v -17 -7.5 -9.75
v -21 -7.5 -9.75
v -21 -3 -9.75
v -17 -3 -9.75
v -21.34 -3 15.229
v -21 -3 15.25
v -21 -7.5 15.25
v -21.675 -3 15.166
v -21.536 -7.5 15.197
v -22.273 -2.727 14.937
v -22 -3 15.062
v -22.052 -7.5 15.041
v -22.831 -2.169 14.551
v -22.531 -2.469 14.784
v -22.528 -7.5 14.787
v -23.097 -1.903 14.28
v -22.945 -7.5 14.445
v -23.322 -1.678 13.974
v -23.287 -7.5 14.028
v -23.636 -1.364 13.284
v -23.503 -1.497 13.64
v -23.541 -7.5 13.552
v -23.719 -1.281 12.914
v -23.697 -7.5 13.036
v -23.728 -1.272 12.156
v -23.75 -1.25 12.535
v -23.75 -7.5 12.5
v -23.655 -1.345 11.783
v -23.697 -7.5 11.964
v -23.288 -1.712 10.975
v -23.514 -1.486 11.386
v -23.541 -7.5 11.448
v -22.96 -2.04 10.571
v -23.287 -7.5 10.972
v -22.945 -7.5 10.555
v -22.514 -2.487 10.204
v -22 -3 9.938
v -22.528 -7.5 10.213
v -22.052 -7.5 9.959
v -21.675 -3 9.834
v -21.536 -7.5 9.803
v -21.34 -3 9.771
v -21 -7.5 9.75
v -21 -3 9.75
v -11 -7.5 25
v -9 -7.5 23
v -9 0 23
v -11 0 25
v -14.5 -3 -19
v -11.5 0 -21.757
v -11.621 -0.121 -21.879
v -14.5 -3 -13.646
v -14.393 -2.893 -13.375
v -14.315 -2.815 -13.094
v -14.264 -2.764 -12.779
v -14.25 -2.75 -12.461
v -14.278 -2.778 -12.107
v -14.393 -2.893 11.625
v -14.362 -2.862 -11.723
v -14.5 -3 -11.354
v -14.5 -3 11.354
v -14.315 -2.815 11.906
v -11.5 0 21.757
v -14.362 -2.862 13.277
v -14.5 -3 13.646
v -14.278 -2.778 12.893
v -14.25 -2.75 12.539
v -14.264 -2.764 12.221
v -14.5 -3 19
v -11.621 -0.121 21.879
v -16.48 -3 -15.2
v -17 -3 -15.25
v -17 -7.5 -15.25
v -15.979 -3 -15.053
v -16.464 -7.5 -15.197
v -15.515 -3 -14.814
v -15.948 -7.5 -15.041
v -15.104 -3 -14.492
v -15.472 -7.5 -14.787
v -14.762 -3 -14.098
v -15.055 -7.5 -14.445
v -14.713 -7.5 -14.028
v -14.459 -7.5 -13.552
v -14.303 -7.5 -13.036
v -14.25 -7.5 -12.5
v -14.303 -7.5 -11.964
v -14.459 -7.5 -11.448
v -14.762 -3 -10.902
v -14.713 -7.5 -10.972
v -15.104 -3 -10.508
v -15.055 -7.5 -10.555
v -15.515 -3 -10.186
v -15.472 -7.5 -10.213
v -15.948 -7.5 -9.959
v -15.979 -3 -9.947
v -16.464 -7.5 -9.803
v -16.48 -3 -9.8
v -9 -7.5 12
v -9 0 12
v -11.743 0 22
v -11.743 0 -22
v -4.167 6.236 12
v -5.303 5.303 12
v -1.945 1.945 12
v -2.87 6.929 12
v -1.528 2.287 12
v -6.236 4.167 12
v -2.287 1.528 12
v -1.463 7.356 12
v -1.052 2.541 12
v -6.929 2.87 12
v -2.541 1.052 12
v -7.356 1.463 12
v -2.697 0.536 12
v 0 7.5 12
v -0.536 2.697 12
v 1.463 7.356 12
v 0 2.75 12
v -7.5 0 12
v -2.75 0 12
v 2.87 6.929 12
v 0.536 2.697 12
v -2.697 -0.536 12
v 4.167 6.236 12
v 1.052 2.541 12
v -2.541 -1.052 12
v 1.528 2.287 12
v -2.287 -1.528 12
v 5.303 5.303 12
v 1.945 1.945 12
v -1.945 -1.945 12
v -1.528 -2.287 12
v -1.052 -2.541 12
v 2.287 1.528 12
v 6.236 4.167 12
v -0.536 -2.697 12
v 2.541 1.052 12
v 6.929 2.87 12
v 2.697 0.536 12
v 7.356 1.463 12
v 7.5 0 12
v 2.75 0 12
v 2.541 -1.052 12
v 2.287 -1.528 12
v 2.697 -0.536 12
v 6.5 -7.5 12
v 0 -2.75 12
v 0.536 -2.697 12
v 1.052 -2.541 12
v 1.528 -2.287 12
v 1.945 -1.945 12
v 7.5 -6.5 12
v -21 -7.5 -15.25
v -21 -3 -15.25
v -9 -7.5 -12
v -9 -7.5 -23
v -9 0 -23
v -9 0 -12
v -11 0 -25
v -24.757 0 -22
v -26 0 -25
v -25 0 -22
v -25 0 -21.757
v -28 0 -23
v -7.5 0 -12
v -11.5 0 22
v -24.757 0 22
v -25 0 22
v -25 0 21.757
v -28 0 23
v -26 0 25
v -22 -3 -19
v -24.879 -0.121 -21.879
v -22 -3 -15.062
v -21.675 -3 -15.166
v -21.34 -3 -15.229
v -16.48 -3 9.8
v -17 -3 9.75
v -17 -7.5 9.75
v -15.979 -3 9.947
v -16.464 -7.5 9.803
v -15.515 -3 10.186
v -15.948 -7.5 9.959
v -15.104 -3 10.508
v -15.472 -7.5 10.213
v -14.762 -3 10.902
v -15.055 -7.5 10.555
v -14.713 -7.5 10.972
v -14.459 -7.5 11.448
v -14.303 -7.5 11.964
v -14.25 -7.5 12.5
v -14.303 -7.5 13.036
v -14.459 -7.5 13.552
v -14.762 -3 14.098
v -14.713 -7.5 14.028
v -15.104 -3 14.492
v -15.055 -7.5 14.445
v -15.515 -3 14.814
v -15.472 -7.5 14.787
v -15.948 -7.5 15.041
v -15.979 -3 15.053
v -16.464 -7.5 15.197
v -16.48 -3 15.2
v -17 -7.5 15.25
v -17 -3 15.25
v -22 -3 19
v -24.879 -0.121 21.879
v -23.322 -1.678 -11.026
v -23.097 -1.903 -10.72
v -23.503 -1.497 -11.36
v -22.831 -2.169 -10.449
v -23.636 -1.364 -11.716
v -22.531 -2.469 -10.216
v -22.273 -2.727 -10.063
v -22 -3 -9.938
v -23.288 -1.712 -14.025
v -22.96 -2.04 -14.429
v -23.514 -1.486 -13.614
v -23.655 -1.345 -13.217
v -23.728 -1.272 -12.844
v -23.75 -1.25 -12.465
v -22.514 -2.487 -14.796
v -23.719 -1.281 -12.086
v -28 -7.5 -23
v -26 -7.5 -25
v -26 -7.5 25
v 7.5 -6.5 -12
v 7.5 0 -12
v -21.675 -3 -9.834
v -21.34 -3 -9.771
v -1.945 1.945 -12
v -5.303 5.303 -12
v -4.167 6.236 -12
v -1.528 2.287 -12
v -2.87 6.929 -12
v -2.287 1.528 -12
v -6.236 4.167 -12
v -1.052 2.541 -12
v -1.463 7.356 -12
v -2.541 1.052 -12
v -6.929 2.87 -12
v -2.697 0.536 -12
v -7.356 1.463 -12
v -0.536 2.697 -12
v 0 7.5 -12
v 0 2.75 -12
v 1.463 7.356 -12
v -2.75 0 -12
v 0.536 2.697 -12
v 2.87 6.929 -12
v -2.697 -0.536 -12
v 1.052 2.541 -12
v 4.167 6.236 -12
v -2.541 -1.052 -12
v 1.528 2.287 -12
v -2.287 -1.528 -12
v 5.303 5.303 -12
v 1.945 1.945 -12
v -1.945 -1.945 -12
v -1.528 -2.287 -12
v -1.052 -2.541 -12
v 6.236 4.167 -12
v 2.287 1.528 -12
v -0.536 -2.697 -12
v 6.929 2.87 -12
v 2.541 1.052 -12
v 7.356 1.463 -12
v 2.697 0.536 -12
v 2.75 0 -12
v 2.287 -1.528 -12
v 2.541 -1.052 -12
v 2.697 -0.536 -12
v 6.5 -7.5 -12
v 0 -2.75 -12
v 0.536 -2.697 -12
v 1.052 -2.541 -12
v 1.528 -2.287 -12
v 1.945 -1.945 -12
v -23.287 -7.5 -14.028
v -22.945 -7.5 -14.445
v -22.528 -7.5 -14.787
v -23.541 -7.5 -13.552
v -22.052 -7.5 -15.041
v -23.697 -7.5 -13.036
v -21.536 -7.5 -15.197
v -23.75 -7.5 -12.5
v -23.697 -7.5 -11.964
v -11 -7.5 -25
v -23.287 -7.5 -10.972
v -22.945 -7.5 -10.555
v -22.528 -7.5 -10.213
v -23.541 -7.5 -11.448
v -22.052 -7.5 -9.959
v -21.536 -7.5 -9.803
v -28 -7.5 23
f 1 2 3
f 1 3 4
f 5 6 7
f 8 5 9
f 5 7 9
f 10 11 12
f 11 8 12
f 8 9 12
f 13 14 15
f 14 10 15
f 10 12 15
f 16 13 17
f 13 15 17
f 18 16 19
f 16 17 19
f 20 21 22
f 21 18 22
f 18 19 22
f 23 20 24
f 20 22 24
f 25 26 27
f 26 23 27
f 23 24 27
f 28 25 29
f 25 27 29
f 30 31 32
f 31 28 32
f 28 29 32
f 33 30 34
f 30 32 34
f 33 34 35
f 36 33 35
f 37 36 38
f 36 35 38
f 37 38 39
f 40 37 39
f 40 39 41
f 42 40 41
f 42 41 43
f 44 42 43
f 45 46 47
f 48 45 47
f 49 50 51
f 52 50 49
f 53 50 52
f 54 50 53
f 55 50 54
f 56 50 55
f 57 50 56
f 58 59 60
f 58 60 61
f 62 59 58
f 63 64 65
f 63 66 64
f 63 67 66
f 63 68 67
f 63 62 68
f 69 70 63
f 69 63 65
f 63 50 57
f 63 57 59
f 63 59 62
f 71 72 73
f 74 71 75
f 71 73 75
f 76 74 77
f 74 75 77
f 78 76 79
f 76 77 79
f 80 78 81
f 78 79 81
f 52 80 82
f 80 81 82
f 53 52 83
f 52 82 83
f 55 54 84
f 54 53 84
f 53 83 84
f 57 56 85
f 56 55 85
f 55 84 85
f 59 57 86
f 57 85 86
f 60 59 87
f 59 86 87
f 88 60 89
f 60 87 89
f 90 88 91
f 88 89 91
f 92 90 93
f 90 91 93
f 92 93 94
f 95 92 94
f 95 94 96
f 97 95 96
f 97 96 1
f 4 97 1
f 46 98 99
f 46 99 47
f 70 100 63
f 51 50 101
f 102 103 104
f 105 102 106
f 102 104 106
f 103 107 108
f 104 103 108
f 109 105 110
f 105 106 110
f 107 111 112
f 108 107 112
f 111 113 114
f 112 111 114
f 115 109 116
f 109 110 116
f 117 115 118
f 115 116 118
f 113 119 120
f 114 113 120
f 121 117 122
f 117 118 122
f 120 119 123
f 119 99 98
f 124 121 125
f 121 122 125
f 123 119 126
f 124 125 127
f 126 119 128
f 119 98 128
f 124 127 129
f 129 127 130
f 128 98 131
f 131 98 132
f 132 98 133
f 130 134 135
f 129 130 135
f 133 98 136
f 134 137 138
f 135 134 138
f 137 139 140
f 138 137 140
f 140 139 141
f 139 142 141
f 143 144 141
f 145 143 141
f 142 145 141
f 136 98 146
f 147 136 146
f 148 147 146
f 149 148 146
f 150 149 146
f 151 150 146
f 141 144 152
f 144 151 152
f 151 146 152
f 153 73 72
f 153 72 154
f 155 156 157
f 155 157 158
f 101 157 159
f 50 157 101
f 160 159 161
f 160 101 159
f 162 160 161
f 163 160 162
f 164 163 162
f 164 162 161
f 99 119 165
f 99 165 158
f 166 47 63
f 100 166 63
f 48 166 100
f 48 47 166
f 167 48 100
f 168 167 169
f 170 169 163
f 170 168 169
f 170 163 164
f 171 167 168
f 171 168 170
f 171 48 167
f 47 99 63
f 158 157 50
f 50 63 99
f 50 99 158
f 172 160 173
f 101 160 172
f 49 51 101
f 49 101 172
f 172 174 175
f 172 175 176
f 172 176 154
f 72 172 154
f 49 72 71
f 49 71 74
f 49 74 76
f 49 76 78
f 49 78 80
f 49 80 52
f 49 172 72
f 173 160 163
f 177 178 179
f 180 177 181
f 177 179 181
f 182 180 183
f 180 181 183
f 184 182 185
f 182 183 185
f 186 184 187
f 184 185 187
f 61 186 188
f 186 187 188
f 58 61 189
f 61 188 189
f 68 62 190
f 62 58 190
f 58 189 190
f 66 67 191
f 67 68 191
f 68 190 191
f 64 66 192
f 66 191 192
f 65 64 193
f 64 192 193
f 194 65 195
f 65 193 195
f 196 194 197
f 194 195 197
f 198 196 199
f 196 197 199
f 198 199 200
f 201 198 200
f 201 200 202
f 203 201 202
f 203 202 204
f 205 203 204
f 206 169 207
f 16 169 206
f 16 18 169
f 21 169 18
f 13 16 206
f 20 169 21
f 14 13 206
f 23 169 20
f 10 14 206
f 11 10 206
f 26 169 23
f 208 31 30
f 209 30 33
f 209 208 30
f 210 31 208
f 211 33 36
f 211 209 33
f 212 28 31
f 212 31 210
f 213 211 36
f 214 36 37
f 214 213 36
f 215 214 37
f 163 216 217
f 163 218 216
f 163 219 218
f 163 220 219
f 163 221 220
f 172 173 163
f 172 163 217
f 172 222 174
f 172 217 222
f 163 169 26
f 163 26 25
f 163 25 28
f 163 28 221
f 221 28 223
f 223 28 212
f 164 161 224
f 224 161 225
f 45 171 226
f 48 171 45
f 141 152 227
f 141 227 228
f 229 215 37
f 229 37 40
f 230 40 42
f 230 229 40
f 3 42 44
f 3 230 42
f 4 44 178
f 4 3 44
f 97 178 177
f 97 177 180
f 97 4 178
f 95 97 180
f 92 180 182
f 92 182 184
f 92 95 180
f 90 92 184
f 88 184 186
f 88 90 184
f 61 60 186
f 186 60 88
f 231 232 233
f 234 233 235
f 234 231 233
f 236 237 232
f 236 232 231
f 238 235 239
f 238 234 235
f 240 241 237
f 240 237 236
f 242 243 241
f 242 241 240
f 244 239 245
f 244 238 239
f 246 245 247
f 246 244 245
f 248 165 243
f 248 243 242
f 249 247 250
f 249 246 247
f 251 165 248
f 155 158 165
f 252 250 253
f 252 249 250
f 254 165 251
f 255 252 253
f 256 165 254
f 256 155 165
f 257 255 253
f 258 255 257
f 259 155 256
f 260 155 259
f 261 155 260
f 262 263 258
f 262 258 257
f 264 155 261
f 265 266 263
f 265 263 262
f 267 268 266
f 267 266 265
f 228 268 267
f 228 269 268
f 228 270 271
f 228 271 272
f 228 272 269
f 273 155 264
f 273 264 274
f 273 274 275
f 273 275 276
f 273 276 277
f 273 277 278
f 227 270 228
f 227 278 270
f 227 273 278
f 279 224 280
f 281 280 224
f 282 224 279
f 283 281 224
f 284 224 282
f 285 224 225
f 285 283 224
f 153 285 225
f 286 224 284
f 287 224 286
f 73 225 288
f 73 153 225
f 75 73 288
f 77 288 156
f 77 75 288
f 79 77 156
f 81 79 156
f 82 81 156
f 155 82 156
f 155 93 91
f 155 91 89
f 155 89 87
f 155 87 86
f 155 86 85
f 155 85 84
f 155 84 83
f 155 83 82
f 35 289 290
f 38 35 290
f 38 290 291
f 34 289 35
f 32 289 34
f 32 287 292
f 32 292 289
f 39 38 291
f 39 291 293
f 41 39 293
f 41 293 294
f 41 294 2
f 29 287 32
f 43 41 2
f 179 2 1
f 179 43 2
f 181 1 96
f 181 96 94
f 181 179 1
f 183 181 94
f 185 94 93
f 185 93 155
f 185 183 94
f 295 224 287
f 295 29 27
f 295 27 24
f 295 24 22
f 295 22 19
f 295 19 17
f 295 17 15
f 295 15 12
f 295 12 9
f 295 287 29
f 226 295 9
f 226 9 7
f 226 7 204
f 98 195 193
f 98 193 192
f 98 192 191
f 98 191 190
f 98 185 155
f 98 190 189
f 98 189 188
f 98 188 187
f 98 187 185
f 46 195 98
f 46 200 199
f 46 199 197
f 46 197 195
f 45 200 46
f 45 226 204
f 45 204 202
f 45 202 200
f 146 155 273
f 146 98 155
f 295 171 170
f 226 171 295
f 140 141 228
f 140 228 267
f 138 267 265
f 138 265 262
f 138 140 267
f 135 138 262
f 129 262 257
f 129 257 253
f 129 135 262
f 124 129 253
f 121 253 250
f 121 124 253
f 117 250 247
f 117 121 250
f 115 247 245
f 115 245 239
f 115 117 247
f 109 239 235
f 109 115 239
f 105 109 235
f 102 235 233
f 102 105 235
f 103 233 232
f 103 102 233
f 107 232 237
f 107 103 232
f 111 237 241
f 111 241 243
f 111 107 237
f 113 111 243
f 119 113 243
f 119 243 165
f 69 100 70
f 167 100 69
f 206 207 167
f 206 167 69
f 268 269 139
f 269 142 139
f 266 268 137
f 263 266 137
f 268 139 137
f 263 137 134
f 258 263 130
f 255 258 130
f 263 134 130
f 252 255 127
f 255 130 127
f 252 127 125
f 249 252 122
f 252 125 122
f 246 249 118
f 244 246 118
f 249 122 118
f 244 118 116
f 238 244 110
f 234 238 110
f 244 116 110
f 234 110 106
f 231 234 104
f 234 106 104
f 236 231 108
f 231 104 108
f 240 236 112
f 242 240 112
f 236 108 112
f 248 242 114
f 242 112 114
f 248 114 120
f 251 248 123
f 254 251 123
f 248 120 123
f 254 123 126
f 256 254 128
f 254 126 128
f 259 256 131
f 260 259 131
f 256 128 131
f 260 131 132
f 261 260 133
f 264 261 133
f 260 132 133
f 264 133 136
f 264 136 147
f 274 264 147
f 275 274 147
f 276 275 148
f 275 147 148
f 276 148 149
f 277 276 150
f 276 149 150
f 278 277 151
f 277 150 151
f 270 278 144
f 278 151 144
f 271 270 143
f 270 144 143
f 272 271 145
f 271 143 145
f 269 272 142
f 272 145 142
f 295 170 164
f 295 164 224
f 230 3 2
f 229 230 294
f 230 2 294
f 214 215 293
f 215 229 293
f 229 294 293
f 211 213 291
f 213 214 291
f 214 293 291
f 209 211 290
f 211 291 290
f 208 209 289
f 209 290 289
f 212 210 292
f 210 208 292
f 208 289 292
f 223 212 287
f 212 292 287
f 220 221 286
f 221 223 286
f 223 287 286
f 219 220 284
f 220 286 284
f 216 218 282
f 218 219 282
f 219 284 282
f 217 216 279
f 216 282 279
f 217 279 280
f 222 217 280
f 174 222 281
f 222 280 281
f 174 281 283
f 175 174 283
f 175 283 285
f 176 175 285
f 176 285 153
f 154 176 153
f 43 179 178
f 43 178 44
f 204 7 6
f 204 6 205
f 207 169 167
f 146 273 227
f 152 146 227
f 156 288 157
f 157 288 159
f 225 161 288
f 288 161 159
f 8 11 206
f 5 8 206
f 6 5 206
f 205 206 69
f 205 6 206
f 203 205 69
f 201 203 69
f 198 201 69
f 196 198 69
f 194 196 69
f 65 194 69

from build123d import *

# Parameters (mm, degrees)
BOSS_EXTRUDE1_DEPTH = 25
MOUNT_HOLES_DEPTH   = 41.422765863
SKETCH7_W           = 16.5
SKETCH7_H           = 13
CUT_PART_DEPTH      = 20
SKETCH10_R          = 2.75
CUT_EXTRUDE3_DEPTH  = 25
CHAMFER1_SIZE       = 2
CUT_EXTRUDE4_DEPTH  = 3
CHAMFER2_SIZE       = 3


with BuildPart() as part:
    # contour → Boss-Extrude1 (new, symmetric)
    with BuildSketch(Plane.XY):
        with BuildLine():
            Line((0, -7.5), (6.5, -7.5))
            Line((6.5, -7.5), (7.5, -6.5))
            Line((7.5, -6.5), (7.5, 0))
            ThreePointArc((7.5, 0), (-3.9135e-05, 7.5), (-7.5, -7.827e-05))
            Line((-7.5, -7.827e-05), (-28, -7.827e-05))
            Line((-28, -7.827e-05), (-28, -7.5))
            Line((-28, -7.5), (0, -7.5))
        make_face()
    extrude(amount=BOSS_EXTRUDE1_DEPTH, both=True)

    # Sketch6 → mount-holes (cut, through all)
    with BuildSketch(Plane.XZ.offset(7.5)):
        with BuildLine():
            Line((-21, 15.25), (-17, 15.25))
            ThreePointArc((-17, 15.25), (-14.25, 12.5), (-17, 9.75))
            Line((-17, 9.75), (-21, 9.75))
            ThreePointArc((-21, 9.75), (-23.75, 12.5), (-21, 15.25))
        make_face()
        with BuildLine():
            Line((-21, -9.75), (-17, -9.75))
            ThreePointArc((-17, -9.75), (-14.25, -12.5), (-17, -15.25))
            Line((-17, -15.25), (-21, -15.25))
            ThreePointArc((-21, -15.25), (-23.75, -12.5), (-21, -9.75))
        make_face()
    extrude(amount=-MOUNT_HOLES_DEPTH, mode=Mode.SUBTRACT)

    # Sketch7 → cut-part (cut)
    with BuildSketch(Plane.XZ.offset(7.5)):
        with Locations((-0.75, 18.5)):
            Rectangle(SKETCH7_W, SKETCH7_H)
        with Locations((-0.75, -18.5)):
            Rectangle(SKETCH7_W, SKETCH7_H)
    extrude(amount=-CUT_PART_DEPTH, mode=Mode.SUBTRACT)

    # Sketch10 → Cut-Extrude3 (cut, symmetric)
    with BuildSketch(Plane.XY):
        Circle(SKETCH10_R)
    extrude(amount=CUT_EXTRUDE3_DEPTH, both=True, mode=Mode.SUBTRACT)

    # Chamfer1
    chamfer1_edges = [part.edges().sort_by_distance(p)[0] for p in [
        (-28, -3.750039135, 25),
        (-9, -3.750039135, 25),
        (-28, -3.750039135, -25),
        (-9, -3.750039135, -25),
    ]]
    chamfer(chamfer1_edges, length=CHAMFER1_SIZE)

    # Sketch11 → Cut-Extrude4 (cut)
    with BuildSketch(Plane(origin=(0, -7.827e-05, 0), x_dir=(1, 0, 0), z_dir=(0, 1, 0))):
        Polygon((-11.5, -21.757359313), (-11.5, 21.757359313), (-11.742640687, 22), (-24.757359313, 22), (-25, 21.757359313), (-25, -21.757359313), (-24.757359313, -22), (-11.742640687, -22), align=None)
    extrude(amount=-CUT_EXTRUDE4_DEPTH, mode=Mode.SUBTRACT)

    # Chamfer2
    # the kernel refuses this chamfer: 3 mm, written as the material it adds along each edge
    with BuildSketch(Plane(origin=(-11.5, -3.00007827, 29.472408277), x_dir=(0.027495876610585626, 0.9996219169112968, 0), z_dir=(0, 0, -1))) as chamfer2_piece_1_section:
        Polygon((CHAMFER2_SIZE * 0.999621916911, -CHAMFER2_SIZE * 0.0274958766106), (-CHAMFER2_SIZE * 0.0274958766106, -CHAMFER2_SIZE * 0.999621916911), (0, 0), align=None)
    chamfer2_piece_1 = extrude(amount=58.944816554, mode=Mode.PRIVATE)
    chamfer2_piece_1 = split(chamfer2_piece_1, bisect_by=Plane(origin=(-12.500072931, -2.000114735, -22), z_dir=(0, 0, 1)), keep=Keep.TOP, mode=Mode.PRIVATE)
    chamfer2_piece_1 = split(chamfer2_piece_1, bisect_by=Plane(origin=(-1.121356809, -2.000114735, 11.378716122), z_dir=(-0.7071067811865476, 0, -0.7071067811865476)), keep=Keep.TOP, mode=Mode.PRIVATE)
    chamfer2_piece_1 = chamfer2_piece_1 - Plane(origin=(-17, -2.000114735, -12.5), x_dir=(0, 0, 1), z_dir=(0, -1, 0)) * Cylinder(2.75, 130, mode=Mode.PRIVATE)
    chamfer2_piece_1 = chamfer2_piece_1 - Plane(origin=(-17, -2.000114735, 12.5), x_dir=(0, 0, 1), z_dir=(0, -1, 0)) * Cylinder(2.75, 130, mode=Mode.PRIVATE)
    add(chamfer2_piece_1)
    with BuildSketch(Plane(origin=(-32.472408277, -3.00007827, 22), x_dir=(0, 0.9996219169112968, 0.027495876610586778), z_dir=(1, 0, 0))) as chamfer2_piece_2_section:
        Polygon((CHAMFER2_SIZE * 0.999621916911, -CHAMFER2_SIZE * 0.0274958766106), (-CHAMFER2_SIZE * 0.0274958766106, -CHAMFER2_SIZE * 0.999621916911), (0, 0), align=None)
    chamfer2_piece_2 = extrude(amount=28.444816553, mode=Mode.PRIVATE)
    chamfer2_piece_2 = split(chamfer2_piece_2, bisect_by=Plane(origin=(-11.5, -2.001383642, 20.997389255), z_dir=(-1, 0, 0)), keep=Keep.TOP, mode=Mode.PRIVATE)
    chamfer2_piece_2 = split(chamfer2_piece_2, bisect_by=Plane(origin=(-22.004985029, -2.001383642, 24.752374284), z_dir=(0.7071067811865527, 0, -0.7071067811865424)), keep=Keep.TOP, mode=Mode.PRIVATE)
    add(chamfer2_piece_2)
    with BuildSketch(Plane(origin=(-25, -3.00007827, -29.472408277), x_dir=(-0.027495876610586778, 0.9996219169112968, 0), z_dir=(0, 0, 1))) as chamfer2_piece_3_section:
        Polygon((CHAMFER2_SIZE * 0.999621916911, -CHAMFER2_SIZE * 0.0274958766106), (-CHAMFER2_SIZE * 0.0274958766106, -CHAMFER2_SIZE * 0.999621916911), (0, 0), align=None)
    chamfer2_piece_3 = extrude(amount=58.944816554, mode=Mode.PRIVATE)
    chamfer2_piece_3 = split(chamfer2_piece_3, bisect_by=Plane(origin=(-35.402787978, -1.975969948, -11.354571334), z_dir=(0.7071067811865527, 0, 0.7071067811865424)), keep=Keep.TOP, mode=Mode.PRIVATE)
    chamfer2_piece_3 = split(chamfer2_piece_3, bisect_by=Plane(origin=(-24.048216644, -1.975969948, 22), z_dir=(0, 0, -1)), keep=Keep.TOP, mode=Mode.PRIVATE)
    chamfer2_piece_3 = chamfer2_piece_3 - Plane(origin=(-21, -1.975969948, -12.5), x_dir=(0, 0, -1), z_dir=(0, -1, 0)) * Cylinder(2.75, 130, mode=Mode.PRIVATE)
    chamfer2_piece_3 = chamfer2_piece_3 - Plane(origin=(-21, -1.975969948, 12.5), x_dir=(0, 0, -1), z_dir=(0, -1, 0)) * Cylinder(2.75, 130, mode=Mode.PRIVATE)
    add(chamfer2_piece_3)
    with BuildSketch(Plane(origin=(-4.027591723, -3.00007827, -22), x_dir=(0, 0.9996219169112968, -0.027495876610586778), z_dir=(-1, 0, 0))) as chamfer2_piece_4_section:
        Polygon((CHAMFER2_SIZE * 0.999621916911, -CHAMFER2_SIZE * 0.0274958766106), (-CHAMFER2_SIZE * 0.0274958766106, -CHAMFER2_SIZE * 0.999621916911), (0, 0), align=None)
    chamfer2_piece_4 = extrude(amount=28.444816553, mode=Mode.PRIVATE)
    chamfer2_piece_4 = split(chamfer2_piece_4, bisect_by=Plane(origin=(-11.5, -2.001383642, -20.997389255), z_dir=(-1, 0, 0)), keep=Keep.TOP, mode=Mode.PRIVATE)
    chamfer2_piece_4 = split(chamfer2_piece_4, bisect_by=Plane(origin=(-25, -2.001383642, -20.997389255), z_dir=(1, 0, 0)), keep=Keep.TOP, mode=Mode.PRIVATE)
    add(chamfer2_piece_4)


solid = part.part
